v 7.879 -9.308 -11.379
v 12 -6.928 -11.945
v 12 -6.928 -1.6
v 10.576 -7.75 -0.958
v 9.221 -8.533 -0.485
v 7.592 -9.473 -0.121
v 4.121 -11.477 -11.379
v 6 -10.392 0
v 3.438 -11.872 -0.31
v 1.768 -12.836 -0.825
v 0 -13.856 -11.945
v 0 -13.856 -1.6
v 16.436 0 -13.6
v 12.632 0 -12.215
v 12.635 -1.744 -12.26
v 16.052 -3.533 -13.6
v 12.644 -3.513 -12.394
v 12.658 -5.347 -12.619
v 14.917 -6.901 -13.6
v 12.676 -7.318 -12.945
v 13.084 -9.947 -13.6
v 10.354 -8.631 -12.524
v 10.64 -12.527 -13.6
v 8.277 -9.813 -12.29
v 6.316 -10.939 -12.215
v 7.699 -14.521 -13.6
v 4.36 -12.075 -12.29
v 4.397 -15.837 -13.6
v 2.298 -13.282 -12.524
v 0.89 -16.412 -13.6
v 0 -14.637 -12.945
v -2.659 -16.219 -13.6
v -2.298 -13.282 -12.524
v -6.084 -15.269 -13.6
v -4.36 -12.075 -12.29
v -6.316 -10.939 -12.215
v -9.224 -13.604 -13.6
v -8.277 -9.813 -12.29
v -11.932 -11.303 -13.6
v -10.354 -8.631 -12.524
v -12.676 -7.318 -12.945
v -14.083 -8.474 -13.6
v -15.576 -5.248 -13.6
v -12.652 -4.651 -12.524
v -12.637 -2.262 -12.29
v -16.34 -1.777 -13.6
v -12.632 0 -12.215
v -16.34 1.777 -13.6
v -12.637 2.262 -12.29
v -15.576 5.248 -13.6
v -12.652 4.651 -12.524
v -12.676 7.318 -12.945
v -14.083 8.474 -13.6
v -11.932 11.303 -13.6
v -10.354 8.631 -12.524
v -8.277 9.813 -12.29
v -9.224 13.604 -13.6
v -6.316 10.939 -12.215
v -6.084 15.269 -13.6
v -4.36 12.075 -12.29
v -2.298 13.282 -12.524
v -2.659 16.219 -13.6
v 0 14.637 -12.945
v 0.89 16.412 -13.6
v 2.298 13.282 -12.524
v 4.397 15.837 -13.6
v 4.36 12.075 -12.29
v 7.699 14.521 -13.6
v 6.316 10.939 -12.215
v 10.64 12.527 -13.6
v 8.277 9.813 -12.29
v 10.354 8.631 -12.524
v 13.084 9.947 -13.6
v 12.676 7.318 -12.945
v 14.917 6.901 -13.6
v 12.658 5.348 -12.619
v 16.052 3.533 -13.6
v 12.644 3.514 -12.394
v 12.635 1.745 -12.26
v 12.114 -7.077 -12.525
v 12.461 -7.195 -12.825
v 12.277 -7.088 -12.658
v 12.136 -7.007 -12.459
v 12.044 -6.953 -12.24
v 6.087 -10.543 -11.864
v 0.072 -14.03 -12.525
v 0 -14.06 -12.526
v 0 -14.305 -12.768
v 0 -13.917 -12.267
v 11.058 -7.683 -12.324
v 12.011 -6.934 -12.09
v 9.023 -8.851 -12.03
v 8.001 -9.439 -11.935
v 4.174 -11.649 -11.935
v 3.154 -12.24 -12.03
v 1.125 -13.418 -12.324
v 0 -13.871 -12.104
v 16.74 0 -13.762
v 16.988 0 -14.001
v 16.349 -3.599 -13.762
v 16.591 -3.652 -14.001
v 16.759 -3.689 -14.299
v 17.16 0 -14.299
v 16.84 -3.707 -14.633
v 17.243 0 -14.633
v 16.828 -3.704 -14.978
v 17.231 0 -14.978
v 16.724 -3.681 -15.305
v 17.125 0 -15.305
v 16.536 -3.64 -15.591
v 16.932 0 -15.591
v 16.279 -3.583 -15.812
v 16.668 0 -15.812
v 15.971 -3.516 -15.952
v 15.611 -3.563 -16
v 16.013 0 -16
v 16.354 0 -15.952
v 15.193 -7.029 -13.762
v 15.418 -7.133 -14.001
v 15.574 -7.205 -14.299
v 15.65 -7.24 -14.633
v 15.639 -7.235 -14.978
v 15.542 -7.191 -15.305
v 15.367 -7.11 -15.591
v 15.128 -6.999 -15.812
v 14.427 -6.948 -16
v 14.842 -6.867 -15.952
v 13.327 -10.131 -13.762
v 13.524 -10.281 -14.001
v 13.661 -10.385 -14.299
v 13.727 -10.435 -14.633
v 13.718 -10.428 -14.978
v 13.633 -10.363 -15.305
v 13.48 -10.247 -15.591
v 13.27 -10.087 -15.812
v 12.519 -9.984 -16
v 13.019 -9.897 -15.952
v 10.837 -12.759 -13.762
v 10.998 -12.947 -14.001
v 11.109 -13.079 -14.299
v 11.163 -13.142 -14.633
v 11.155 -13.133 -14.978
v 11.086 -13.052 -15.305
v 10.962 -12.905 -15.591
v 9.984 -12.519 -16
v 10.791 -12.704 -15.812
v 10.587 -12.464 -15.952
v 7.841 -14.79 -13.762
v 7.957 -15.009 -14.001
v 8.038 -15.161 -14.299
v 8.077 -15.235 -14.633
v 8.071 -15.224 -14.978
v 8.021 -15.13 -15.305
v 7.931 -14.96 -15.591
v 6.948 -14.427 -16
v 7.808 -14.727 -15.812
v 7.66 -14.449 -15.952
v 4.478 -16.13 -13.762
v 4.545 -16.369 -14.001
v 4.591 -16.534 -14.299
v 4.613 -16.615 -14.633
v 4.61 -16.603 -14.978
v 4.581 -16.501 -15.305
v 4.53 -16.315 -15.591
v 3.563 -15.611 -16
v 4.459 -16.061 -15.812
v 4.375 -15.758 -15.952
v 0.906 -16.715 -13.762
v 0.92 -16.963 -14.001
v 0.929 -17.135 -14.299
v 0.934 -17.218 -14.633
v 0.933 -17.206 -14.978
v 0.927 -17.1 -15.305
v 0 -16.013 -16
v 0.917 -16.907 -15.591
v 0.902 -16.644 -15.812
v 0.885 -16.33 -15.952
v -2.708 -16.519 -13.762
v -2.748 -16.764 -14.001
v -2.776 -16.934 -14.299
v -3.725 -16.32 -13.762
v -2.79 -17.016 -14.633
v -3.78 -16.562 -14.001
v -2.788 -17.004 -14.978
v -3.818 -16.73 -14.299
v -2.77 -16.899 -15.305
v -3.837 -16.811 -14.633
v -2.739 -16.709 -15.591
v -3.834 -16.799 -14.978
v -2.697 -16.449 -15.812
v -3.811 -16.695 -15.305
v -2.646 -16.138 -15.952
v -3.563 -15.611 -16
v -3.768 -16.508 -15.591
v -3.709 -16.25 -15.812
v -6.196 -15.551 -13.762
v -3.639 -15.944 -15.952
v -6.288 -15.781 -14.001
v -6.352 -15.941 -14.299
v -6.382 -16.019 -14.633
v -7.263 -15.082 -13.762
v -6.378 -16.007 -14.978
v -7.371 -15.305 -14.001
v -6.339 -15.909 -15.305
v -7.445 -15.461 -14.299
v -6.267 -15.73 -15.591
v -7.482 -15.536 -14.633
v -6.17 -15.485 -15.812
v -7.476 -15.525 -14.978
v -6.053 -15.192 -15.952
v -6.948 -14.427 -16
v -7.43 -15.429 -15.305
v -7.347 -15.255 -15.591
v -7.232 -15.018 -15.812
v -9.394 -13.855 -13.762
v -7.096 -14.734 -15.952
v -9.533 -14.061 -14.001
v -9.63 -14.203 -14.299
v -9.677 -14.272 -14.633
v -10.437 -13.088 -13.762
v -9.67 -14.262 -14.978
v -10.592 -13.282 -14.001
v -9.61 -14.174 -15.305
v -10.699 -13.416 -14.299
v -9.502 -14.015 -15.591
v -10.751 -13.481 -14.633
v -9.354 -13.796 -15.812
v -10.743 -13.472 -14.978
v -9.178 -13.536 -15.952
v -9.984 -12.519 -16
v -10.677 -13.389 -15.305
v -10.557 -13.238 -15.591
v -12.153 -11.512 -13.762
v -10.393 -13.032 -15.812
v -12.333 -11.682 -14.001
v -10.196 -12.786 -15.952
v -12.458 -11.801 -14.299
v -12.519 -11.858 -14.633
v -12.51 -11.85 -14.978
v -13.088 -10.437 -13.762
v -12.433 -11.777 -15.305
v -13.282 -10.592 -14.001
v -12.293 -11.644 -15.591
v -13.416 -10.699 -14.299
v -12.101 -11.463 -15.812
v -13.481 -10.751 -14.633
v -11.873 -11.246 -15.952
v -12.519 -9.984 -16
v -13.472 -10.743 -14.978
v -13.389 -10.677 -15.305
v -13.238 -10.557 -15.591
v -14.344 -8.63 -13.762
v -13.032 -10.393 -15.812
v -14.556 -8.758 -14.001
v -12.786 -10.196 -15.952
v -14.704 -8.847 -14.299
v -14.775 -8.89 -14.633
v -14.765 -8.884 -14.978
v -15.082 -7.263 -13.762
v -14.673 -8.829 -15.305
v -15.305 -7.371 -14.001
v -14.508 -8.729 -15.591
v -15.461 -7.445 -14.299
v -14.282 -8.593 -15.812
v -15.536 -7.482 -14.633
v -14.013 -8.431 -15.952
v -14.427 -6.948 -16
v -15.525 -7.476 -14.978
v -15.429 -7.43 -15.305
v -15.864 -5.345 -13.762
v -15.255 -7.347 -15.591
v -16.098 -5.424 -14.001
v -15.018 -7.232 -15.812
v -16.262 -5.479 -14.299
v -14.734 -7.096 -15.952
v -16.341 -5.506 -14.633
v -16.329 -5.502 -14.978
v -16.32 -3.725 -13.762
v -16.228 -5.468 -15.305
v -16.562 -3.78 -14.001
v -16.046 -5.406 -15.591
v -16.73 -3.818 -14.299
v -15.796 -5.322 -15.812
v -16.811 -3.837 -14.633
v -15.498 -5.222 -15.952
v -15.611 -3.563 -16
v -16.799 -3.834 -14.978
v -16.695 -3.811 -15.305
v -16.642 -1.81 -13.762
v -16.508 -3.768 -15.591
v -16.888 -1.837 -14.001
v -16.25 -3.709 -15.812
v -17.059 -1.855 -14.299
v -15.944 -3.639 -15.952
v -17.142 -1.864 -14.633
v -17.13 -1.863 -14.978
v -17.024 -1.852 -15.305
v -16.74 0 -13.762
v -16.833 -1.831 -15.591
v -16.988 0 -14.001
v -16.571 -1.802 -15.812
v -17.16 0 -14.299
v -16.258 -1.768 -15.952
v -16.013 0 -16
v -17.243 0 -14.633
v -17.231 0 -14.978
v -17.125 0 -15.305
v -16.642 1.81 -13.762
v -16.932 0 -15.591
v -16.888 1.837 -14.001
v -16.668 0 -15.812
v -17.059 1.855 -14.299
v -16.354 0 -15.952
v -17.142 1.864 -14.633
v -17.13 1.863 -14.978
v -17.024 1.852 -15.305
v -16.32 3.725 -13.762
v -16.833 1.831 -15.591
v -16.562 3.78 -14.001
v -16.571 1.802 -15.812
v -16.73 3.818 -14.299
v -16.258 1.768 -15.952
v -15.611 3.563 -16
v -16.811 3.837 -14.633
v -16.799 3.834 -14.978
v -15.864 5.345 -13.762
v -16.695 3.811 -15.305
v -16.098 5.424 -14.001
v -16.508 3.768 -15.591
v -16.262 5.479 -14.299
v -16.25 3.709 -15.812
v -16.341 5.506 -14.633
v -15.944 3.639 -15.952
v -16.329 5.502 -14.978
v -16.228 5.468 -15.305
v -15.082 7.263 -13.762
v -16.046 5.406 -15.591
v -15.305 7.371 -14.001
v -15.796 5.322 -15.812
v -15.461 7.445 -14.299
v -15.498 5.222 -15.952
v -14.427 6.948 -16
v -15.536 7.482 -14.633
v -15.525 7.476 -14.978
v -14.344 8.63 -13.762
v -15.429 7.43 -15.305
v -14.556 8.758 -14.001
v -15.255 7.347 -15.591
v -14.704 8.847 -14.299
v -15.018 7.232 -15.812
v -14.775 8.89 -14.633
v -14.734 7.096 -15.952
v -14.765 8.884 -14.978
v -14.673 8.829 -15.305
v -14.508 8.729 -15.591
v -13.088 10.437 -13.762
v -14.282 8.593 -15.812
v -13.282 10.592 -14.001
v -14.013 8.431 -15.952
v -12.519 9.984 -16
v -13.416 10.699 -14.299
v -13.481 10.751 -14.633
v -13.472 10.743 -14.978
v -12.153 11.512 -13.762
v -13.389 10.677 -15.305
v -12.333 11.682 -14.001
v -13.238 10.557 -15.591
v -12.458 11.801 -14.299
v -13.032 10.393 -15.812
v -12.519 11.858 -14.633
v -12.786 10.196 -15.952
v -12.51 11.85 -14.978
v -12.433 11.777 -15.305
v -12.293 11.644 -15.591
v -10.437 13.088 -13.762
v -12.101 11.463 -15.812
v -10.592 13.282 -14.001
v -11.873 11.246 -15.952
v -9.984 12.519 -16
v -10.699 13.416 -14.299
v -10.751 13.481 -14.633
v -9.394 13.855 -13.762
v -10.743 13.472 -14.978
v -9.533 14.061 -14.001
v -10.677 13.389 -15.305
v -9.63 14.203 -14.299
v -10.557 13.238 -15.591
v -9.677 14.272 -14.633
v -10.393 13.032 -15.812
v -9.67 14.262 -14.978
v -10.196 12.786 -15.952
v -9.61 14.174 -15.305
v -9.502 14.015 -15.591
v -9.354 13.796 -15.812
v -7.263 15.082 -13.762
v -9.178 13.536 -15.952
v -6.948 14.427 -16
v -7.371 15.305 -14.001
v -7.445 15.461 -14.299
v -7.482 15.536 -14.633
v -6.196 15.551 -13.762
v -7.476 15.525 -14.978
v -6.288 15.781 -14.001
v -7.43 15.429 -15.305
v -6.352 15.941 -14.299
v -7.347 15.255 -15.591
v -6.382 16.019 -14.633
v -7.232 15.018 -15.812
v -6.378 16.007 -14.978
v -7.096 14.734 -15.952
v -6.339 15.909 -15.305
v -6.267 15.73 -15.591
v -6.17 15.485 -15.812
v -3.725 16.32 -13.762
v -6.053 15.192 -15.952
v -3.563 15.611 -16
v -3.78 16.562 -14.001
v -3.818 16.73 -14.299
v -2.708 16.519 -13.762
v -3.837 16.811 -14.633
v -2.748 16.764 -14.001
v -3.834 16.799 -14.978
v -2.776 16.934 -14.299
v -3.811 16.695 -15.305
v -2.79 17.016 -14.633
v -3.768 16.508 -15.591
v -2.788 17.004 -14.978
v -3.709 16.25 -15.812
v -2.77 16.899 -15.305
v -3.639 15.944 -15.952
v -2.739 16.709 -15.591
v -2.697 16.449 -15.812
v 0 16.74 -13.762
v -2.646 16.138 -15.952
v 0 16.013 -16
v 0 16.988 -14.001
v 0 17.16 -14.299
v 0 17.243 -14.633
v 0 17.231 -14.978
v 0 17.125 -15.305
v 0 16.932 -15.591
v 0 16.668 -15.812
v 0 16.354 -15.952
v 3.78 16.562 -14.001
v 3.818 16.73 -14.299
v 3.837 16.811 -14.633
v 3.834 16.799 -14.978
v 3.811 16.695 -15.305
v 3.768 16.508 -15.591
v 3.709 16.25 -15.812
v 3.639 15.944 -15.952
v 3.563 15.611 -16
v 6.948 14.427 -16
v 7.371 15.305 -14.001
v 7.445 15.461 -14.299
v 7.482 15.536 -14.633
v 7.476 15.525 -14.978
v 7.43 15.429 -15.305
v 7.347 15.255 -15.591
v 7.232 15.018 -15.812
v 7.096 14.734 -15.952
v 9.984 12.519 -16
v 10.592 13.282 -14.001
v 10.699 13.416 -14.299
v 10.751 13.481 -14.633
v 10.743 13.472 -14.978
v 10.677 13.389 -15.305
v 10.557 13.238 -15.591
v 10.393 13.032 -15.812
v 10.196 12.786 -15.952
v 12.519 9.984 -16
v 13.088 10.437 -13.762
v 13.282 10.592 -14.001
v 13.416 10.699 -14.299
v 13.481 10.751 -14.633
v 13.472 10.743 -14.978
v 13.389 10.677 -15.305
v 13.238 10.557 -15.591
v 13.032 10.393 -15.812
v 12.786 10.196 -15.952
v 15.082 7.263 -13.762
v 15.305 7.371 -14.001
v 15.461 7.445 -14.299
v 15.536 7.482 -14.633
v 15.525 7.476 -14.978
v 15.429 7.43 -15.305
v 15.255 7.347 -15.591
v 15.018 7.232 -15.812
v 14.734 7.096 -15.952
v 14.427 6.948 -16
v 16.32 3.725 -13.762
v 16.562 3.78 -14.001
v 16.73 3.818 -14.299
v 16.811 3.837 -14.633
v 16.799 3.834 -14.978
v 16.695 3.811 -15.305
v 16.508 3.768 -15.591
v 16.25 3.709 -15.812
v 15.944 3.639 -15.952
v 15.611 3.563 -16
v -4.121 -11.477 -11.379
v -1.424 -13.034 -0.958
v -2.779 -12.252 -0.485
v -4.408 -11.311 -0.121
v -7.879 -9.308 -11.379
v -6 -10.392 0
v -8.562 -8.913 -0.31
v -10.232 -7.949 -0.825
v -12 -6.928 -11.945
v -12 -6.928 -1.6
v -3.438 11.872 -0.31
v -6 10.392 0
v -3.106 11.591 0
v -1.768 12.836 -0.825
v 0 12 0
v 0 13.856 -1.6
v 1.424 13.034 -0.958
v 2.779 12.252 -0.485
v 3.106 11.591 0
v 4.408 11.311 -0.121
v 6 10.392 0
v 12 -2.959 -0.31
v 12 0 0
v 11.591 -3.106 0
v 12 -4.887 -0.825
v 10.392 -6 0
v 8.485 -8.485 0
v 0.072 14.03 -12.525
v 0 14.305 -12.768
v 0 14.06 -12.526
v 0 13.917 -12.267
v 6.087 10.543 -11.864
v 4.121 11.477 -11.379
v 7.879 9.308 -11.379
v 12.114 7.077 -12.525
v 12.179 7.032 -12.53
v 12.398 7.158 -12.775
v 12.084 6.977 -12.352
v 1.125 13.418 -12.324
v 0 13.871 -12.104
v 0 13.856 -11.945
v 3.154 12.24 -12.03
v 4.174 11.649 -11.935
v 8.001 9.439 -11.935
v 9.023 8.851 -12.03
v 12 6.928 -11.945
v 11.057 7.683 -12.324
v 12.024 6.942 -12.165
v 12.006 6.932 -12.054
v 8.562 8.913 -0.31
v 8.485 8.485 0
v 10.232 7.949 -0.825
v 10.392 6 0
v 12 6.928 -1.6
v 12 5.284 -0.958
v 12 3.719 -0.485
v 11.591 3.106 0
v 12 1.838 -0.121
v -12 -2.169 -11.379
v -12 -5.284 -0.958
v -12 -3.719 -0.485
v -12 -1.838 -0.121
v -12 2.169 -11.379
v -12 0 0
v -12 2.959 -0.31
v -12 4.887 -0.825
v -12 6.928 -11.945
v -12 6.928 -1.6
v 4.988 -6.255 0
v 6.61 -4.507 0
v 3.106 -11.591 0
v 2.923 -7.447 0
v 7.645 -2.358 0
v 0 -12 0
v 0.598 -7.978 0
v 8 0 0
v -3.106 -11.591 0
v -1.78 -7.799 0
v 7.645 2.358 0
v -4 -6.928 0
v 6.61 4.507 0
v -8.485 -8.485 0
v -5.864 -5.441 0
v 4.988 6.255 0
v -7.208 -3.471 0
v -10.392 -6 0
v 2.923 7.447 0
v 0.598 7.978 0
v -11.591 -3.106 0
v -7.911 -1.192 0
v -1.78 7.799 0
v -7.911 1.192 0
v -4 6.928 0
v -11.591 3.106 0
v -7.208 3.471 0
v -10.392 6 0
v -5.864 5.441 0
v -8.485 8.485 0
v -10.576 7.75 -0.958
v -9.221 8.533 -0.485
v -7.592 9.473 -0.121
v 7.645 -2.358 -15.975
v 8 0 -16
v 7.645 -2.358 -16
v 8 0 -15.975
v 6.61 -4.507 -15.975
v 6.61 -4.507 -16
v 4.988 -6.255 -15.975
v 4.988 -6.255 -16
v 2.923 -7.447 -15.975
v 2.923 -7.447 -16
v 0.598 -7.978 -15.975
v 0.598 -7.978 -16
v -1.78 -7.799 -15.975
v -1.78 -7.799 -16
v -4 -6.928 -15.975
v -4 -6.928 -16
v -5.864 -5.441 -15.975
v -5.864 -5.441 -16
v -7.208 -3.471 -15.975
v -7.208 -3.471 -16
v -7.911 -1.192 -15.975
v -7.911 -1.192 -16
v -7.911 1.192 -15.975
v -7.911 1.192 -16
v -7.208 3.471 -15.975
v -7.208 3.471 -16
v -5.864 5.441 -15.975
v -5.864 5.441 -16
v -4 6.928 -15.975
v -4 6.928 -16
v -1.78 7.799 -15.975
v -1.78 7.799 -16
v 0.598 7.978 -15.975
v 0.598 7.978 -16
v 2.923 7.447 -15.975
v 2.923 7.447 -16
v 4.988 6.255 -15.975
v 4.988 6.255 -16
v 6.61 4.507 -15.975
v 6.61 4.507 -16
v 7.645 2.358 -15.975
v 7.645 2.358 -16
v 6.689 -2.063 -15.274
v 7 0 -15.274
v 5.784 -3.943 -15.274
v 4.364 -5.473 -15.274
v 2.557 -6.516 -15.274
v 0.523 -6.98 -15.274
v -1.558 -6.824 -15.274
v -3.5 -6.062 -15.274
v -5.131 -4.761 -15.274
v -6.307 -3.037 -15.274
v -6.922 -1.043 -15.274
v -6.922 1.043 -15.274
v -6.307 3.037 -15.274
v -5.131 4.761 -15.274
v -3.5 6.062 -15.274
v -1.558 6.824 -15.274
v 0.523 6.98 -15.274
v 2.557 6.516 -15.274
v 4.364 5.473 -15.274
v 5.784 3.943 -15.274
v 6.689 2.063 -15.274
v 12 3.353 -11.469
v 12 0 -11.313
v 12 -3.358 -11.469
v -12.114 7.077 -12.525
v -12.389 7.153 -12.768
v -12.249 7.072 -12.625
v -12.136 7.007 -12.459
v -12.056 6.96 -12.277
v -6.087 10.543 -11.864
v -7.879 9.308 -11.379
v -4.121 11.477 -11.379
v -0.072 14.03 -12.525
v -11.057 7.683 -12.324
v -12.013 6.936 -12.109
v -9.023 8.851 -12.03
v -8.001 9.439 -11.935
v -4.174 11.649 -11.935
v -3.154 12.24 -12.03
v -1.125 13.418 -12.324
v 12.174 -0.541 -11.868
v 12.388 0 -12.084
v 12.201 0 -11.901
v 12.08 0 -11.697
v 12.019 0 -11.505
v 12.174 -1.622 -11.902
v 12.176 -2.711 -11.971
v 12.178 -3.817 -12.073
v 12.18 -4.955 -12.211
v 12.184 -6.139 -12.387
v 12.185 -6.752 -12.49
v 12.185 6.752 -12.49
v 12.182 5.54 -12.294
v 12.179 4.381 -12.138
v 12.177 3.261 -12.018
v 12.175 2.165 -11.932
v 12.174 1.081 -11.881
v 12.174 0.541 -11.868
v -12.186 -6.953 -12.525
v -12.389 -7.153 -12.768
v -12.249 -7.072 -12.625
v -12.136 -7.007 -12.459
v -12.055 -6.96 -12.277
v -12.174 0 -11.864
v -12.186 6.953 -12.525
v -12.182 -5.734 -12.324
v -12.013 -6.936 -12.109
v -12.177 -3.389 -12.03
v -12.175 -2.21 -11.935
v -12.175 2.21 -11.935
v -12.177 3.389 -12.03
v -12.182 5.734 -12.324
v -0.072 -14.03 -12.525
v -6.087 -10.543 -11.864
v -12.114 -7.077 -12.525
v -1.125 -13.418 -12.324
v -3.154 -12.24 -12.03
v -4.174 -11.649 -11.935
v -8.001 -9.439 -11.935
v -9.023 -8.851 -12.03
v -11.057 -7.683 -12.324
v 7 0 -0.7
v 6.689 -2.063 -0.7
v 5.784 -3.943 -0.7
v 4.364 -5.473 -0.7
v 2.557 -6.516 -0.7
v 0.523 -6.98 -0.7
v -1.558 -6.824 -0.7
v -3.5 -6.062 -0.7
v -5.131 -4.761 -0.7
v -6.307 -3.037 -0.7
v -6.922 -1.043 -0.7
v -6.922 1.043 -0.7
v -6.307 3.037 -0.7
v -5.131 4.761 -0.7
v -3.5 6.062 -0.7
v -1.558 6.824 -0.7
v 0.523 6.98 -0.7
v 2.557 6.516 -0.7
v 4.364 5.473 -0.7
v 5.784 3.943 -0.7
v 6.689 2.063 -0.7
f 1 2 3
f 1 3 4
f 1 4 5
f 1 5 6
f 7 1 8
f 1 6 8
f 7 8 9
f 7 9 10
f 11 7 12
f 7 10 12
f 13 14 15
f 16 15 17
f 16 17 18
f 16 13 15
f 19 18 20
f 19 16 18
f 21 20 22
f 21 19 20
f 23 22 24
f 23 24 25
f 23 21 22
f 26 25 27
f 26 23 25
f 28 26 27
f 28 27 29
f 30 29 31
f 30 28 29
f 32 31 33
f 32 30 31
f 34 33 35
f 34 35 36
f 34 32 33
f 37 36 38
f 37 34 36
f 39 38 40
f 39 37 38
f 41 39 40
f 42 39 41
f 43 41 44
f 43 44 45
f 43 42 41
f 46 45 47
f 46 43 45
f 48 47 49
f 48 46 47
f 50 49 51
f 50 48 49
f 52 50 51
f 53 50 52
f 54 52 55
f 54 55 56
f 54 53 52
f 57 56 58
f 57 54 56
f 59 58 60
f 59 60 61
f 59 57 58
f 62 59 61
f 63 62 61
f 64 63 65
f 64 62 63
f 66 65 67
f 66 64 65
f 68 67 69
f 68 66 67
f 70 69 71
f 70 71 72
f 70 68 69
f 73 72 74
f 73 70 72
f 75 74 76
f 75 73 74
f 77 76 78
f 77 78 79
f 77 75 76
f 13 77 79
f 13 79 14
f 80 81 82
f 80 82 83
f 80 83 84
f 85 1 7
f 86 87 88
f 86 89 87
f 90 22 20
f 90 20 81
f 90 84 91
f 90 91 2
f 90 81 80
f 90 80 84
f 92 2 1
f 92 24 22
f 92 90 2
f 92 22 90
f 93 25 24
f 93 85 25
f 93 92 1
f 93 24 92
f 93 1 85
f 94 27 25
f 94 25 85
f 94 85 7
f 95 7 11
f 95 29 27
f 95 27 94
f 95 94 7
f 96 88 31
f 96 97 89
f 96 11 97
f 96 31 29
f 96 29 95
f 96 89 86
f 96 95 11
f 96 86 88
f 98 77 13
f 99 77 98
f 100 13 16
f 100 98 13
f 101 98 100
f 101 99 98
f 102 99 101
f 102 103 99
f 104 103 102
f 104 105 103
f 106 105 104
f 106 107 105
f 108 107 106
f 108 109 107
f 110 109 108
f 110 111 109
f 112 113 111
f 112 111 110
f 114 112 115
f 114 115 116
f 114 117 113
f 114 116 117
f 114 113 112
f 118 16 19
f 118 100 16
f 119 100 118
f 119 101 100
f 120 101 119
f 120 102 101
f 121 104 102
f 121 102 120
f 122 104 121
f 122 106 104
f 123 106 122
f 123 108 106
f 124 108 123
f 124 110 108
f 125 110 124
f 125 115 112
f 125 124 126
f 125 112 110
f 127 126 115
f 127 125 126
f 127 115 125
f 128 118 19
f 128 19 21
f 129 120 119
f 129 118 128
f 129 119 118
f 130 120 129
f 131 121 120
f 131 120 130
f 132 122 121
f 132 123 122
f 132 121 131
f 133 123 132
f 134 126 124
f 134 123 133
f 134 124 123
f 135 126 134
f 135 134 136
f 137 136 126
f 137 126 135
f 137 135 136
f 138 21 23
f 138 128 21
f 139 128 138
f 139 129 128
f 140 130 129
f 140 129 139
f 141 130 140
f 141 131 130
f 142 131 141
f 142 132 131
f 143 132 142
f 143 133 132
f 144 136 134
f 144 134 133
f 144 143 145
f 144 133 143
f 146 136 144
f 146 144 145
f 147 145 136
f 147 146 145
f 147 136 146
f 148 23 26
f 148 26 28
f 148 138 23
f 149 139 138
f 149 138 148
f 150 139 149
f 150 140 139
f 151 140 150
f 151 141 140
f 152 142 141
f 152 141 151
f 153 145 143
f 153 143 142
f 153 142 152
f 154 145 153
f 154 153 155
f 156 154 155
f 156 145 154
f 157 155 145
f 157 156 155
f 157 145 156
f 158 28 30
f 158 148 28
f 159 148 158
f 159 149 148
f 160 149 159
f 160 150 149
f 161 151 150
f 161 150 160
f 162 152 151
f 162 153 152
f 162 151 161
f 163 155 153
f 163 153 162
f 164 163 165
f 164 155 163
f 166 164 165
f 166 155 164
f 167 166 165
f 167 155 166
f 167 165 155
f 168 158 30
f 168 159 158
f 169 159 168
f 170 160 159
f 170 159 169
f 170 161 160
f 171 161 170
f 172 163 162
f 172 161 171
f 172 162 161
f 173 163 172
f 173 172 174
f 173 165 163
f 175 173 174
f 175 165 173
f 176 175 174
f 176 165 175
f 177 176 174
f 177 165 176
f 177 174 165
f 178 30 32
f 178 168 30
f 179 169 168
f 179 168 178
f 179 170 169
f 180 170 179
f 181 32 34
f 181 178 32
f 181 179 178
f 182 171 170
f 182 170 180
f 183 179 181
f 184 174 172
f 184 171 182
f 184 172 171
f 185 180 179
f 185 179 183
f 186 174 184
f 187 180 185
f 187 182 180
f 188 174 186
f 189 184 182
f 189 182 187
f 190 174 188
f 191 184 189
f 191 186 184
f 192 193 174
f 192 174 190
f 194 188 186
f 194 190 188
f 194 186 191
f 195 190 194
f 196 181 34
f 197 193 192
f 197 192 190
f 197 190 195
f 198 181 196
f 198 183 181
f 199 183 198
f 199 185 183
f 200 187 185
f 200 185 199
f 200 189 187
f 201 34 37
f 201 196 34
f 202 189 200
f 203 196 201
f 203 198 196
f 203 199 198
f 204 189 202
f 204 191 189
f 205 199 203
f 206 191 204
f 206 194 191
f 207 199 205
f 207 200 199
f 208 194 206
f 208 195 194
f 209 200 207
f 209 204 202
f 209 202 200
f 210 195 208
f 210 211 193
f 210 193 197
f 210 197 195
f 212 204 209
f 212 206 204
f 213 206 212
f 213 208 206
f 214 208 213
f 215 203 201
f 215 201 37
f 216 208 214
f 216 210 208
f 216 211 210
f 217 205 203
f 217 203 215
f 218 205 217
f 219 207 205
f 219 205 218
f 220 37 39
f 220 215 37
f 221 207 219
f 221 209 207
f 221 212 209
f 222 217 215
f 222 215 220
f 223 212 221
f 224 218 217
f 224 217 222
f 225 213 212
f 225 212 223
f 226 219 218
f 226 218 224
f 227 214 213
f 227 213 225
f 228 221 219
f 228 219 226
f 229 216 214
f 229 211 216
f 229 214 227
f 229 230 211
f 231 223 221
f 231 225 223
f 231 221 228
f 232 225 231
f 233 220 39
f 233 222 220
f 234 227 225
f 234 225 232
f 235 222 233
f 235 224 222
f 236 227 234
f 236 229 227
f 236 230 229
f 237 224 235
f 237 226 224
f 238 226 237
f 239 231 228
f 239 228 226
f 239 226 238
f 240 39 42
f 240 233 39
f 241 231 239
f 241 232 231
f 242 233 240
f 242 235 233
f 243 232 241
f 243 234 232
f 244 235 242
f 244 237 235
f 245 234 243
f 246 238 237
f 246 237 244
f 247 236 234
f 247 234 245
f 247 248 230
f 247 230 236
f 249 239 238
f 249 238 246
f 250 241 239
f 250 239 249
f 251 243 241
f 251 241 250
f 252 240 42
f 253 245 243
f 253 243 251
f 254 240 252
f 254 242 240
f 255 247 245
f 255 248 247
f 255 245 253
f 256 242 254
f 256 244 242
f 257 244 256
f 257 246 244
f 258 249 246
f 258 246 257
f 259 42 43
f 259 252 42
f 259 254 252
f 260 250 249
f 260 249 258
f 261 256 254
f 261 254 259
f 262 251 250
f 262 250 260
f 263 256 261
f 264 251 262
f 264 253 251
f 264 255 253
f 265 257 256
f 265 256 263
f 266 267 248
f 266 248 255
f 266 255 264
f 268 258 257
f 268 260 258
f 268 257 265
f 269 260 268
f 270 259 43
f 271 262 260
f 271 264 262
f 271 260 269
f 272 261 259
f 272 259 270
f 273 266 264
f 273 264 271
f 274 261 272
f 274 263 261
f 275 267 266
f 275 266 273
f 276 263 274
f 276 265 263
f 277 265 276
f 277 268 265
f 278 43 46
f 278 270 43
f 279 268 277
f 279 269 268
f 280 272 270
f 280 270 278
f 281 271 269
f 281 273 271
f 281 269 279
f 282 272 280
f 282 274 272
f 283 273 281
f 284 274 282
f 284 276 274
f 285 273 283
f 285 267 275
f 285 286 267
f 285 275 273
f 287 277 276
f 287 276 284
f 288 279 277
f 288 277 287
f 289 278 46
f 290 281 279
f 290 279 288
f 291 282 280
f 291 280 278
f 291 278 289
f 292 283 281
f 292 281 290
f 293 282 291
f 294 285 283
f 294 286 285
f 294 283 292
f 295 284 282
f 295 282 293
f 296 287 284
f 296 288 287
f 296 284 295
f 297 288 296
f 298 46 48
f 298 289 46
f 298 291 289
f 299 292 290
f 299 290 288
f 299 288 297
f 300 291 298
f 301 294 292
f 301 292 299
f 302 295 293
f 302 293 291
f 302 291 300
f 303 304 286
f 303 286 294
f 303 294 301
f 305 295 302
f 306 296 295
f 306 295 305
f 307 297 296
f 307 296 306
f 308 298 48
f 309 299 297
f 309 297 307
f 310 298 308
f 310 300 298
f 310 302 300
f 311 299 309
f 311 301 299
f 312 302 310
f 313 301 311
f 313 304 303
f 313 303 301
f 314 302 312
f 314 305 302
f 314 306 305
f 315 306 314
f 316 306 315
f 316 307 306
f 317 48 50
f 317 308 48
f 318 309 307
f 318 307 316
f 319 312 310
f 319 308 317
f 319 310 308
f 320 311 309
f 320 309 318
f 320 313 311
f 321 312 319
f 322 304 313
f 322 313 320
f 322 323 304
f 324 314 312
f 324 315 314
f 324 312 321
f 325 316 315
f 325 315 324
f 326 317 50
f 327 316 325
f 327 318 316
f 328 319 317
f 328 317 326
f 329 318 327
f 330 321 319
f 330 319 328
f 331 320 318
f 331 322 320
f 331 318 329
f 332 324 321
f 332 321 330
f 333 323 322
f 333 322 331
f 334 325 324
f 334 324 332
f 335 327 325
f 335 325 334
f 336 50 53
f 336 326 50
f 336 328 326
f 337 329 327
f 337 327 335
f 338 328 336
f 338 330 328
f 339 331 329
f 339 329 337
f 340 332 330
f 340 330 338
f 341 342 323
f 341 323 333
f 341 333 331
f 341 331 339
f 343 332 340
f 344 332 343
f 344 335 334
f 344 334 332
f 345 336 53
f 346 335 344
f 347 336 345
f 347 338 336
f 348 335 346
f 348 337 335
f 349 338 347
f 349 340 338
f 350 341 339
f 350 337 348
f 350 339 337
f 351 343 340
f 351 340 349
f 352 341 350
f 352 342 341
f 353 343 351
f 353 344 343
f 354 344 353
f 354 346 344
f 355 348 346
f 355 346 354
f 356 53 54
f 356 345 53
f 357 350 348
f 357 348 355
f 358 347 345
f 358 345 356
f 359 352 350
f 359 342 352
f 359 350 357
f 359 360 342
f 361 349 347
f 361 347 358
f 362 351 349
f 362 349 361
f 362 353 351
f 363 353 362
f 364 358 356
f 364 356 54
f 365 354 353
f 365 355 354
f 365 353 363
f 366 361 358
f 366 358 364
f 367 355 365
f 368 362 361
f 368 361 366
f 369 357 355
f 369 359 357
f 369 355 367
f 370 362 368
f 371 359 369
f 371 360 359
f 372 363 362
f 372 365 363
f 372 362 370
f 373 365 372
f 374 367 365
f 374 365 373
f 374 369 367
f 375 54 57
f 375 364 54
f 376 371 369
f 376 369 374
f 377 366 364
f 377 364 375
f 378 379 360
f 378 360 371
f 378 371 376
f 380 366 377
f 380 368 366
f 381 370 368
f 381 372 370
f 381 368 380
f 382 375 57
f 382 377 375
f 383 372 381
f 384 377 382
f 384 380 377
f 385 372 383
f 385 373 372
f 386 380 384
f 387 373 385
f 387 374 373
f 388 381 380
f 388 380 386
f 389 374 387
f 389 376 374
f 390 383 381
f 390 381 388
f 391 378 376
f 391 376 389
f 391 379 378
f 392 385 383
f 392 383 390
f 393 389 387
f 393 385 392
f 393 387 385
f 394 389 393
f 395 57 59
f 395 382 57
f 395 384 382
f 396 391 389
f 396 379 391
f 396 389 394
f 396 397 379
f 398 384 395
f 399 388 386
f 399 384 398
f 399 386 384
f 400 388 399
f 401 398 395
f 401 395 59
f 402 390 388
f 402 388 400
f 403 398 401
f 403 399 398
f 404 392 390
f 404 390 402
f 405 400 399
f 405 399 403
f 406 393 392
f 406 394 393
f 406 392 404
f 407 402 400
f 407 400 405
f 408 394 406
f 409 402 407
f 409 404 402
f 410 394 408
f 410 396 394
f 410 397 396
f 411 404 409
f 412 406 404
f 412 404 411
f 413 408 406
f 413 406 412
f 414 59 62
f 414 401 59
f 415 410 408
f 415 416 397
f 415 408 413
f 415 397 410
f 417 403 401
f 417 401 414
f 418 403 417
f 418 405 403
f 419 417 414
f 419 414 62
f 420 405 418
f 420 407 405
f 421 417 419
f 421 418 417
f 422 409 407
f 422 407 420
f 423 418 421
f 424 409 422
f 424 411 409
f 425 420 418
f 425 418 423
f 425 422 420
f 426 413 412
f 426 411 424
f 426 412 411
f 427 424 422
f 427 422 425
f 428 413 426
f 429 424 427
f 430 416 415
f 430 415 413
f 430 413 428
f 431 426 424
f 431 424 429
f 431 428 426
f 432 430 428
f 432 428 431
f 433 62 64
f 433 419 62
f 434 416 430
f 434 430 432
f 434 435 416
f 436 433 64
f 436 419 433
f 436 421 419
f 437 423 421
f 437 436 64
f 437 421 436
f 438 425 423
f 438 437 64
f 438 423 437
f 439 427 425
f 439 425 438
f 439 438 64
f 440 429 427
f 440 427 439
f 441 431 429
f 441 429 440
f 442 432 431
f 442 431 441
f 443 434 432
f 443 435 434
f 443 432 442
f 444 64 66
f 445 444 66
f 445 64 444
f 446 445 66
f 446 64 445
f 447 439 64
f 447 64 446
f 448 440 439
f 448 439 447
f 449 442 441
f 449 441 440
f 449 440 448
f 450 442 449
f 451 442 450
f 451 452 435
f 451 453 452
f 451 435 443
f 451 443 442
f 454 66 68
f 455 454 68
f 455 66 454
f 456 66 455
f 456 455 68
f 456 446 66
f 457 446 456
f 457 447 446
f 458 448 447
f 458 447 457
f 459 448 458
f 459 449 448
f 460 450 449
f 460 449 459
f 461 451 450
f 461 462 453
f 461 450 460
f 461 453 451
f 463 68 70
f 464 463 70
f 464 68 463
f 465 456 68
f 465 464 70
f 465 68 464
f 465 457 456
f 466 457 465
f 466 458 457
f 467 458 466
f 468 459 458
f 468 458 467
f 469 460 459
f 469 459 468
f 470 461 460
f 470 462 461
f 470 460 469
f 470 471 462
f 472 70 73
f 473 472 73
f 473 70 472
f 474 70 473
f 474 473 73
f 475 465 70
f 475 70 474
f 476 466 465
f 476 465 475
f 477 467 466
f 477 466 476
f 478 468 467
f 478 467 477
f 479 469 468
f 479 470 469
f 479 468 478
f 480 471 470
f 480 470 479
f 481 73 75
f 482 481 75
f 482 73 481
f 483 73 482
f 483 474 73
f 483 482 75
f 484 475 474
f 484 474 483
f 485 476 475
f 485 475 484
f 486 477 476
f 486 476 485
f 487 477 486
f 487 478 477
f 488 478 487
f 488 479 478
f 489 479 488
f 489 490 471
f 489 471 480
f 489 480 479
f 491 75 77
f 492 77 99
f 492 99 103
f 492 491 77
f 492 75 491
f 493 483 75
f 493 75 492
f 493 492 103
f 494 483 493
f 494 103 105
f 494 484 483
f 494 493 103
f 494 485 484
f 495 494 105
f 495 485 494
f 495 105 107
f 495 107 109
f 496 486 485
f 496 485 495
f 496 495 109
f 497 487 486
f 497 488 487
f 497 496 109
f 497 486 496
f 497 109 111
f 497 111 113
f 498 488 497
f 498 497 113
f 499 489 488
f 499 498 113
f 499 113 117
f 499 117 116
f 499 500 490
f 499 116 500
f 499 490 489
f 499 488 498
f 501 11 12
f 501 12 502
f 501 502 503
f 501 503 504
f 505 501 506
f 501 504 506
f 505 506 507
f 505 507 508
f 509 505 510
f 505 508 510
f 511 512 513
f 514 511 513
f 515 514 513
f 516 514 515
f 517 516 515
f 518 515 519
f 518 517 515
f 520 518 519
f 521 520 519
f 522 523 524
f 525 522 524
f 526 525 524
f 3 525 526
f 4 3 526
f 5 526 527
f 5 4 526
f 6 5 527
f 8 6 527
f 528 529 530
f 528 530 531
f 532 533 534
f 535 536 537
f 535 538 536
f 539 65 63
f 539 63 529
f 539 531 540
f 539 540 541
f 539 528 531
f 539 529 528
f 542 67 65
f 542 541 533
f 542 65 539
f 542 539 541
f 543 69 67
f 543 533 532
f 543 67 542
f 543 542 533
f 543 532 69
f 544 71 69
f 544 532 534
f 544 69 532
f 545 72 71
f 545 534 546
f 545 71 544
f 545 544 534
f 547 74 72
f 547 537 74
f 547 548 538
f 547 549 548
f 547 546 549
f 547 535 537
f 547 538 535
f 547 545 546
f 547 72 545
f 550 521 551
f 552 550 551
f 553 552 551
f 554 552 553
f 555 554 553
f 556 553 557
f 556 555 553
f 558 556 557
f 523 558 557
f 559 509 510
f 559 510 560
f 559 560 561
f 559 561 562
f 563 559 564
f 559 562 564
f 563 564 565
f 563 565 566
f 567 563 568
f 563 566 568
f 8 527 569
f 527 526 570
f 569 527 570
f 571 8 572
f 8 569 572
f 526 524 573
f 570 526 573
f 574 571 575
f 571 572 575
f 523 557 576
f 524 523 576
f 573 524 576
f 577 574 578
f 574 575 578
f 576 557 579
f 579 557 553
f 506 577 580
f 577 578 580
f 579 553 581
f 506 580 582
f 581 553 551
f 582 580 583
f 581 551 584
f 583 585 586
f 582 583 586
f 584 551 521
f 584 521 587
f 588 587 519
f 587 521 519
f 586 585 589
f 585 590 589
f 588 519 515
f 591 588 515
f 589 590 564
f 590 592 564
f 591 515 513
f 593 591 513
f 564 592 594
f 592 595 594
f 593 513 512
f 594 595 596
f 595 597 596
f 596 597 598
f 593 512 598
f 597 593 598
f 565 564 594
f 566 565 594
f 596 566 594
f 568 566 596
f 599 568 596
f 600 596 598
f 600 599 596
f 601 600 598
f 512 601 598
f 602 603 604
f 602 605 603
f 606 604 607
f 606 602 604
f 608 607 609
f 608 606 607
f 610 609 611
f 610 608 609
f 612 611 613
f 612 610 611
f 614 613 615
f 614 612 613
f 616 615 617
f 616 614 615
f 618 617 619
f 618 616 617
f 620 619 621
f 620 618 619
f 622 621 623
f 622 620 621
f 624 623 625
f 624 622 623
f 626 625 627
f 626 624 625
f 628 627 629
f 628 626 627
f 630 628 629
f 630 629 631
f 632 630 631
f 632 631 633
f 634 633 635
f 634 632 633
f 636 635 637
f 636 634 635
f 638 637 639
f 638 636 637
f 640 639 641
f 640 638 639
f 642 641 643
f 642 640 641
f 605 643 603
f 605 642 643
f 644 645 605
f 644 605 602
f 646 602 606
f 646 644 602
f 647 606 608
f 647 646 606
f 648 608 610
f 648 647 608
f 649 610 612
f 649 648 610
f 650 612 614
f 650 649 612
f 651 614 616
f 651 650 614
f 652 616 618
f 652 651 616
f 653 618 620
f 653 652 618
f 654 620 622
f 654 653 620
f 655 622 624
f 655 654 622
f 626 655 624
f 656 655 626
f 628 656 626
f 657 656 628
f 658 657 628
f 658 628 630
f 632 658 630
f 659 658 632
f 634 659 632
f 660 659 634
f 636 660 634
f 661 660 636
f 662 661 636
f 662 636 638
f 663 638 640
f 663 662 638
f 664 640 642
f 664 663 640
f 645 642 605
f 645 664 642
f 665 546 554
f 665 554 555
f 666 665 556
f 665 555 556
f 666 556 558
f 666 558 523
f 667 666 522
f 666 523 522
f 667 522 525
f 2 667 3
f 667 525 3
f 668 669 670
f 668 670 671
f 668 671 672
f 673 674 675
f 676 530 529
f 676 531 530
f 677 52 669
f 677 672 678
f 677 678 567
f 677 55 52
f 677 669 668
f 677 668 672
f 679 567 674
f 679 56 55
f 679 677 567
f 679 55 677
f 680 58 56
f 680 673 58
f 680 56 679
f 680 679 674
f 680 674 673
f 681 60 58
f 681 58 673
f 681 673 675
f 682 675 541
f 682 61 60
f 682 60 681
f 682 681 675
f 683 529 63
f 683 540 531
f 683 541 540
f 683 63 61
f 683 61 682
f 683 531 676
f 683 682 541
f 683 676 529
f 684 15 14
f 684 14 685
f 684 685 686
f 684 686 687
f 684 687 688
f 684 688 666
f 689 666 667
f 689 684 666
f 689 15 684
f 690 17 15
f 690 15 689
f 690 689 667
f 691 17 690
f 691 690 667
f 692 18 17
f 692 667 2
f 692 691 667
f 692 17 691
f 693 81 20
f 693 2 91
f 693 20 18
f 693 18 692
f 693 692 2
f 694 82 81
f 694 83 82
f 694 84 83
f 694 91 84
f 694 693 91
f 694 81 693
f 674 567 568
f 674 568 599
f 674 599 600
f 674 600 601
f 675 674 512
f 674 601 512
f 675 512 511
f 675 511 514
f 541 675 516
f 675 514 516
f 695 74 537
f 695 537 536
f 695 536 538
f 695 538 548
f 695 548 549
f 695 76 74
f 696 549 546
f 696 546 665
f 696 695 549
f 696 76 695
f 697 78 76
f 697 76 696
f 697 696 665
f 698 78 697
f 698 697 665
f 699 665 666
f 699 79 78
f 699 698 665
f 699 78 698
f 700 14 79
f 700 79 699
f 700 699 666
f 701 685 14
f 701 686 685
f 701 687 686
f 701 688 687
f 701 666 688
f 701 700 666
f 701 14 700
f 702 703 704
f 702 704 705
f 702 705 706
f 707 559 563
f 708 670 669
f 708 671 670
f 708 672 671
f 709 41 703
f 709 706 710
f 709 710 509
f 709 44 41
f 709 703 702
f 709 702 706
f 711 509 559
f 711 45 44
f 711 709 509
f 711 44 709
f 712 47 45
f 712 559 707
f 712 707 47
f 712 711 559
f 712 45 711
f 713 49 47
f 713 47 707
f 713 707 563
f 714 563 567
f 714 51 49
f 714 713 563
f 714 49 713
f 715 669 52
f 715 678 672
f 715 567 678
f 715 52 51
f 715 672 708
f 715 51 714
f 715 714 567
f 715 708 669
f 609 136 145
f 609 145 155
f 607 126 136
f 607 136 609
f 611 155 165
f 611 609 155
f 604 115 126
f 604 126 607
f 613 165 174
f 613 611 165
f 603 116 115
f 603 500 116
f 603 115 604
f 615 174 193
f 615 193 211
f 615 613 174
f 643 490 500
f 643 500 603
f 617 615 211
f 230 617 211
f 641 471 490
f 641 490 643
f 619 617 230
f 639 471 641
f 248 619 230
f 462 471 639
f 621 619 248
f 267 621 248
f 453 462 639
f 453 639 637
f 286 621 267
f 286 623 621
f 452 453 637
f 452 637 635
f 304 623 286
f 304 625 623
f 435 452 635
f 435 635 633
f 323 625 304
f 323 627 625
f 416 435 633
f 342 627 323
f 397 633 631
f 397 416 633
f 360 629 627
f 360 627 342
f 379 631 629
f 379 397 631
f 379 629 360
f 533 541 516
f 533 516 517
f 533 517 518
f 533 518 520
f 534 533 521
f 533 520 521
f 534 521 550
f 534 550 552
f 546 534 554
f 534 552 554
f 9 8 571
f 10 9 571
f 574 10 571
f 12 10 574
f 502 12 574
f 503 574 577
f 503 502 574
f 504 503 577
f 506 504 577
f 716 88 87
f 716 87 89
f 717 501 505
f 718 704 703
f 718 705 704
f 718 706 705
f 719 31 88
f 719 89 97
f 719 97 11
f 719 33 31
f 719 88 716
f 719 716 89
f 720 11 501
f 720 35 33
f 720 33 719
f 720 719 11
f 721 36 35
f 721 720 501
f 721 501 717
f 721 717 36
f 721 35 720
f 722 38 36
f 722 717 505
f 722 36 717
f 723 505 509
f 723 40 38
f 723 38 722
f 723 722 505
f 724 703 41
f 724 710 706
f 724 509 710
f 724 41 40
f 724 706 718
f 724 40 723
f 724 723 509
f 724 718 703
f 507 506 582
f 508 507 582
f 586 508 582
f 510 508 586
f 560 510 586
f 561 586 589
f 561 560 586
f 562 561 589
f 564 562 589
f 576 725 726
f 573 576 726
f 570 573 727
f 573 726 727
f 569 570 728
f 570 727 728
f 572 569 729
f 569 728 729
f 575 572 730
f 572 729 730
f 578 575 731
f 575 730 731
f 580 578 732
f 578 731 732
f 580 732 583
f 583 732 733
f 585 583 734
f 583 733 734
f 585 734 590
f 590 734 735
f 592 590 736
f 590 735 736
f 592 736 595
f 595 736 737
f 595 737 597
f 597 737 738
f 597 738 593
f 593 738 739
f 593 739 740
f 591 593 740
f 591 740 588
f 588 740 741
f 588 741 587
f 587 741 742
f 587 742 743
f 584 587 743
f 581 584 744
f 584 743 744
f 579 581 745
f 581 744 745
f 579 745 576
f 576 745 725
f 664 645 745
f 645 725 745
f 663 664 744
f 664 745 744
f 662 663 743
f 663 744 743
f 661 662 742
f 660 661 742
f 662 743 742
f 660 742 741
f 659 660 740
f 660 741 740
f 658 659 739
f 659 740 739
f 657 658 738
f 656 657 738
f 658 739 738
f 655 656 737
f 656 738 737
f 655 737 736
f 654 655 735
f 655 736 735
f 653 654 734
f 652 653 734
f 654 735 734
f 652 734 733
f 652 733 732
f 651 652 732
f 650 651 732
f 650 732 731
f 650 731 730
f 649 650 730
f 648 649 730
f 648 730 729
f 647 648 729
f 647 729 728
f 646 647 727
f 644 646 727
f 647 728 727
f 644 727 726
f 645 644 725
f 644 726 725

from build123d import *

# Parameters (mm, degrees)
BASENUTSKE_R   = 7
BASENUT_DEPTH  = 16
FLANGEFILLET_R = 0.96


with BuildPart() as part:
    # BaseNutSke → BaseNut (new body)
    with BuildSketch(Plane.XY):
        Polygon((12, 6.92820323), (12, -6.92820323), (0, -13.856406461), (-12, -6.92820323), (-12, 6.92820323), (0, 13.856406461), align=None)
        Circle(BASENUTSKE_R, mode=Mode.SUBTRACT)
    extrude(amount=-BASENUT_DEPTH)

    # Sketch6 → Flange (revolve)
    with BuildSketch(Plane(origin=(0, 0, 0), x_dir=(0, 0, -1), z_dir=(1, 0, 0)), mode=Mode.PRIVATE) as flange_sk:
        with BuildLine():
            Line((10.165622253, 7), (13.6, 16.435875309))
            ThreePointArc((13.6, 16.435875309), (14.977547085, 17.231202489), (16, 16.012690555))
            Line((16, 16.012690555), (16, 7))
            Line((16, 7), (10.165622253, 7))
        make_face()
    revolve(flange_sk.sketch.rotate(Axis((0, 0, 0), (0, 0, -1)), 90), axis=Axis((0, 0, 0), (0, 0, -1)))

    # Sketch3 → Double-Chamfer (revolve, cut)
    with BuildSketch(Plane(origin=(0, 0, 0), x_dir=(0, 0, -1), z_dir=(1, 0, 0)), mode=Mode.PRIVATE) as double_chamfer_sk:
        Polygon((1.6, 26.556406461), (-12.7, 26.556406461), (-12.7, 12), (0, 12), (1.6, 13.856406461), align=None)
    revolve(double_chamfer_sk.sketch.rotate(Axis((0, 0, 0), (0, 0, -1)), 90), axis=Axis((0, 0, 0), (0, 0, -1)), mode=Mode.SUBTRACT)

    # FlangeFillet
    flangefillet_edges = [part.edges().sort_by_distance(p)[0] for p in [
        (12, -3.479213152, -12.16534592),
        (12, 3.479213152, -12.16534592),
        (6, -10.392304845, -11.985473425),
        (6, 10.392304845, -11.985473425),
        (-6, 10.392304845, -11.985473425),
        (-12, 0, -11.985473425),
        (-6, -10.392304845, -11.985473425),
    ]]
    fillet(flangefillet_edges, radius=FLANGEFILLET_R)

    # Sketch5 (on Right Plane) → EndChamfer (revolve, cut)
    with BuildSketch(Plane(origin=(0, 0, 0), x_dir=(0, 0, -1), z_dir=(1, 0, 0)), mode=Mode.PRIVATE) as endchamfer_sk:
        Polygon((15.9746, 8), (15.204371708, 6.9), (16.0254, 6.9), (16.0254, 8), align=None)
        Polygon((-0.0508, 8), (0, 8), (0.770228292, 6.9), (-0.0508, 6.9), align=None)
    revolve(endchamfer_sk.sketch.rotate(Axis((0, 0, -25.037505729), (0, 0, -1)), 90), axis=Axis((0, 0, -25.037505729), (0, 0, -1)), mode=Mode.SUBTRACT)


solid = part.part
